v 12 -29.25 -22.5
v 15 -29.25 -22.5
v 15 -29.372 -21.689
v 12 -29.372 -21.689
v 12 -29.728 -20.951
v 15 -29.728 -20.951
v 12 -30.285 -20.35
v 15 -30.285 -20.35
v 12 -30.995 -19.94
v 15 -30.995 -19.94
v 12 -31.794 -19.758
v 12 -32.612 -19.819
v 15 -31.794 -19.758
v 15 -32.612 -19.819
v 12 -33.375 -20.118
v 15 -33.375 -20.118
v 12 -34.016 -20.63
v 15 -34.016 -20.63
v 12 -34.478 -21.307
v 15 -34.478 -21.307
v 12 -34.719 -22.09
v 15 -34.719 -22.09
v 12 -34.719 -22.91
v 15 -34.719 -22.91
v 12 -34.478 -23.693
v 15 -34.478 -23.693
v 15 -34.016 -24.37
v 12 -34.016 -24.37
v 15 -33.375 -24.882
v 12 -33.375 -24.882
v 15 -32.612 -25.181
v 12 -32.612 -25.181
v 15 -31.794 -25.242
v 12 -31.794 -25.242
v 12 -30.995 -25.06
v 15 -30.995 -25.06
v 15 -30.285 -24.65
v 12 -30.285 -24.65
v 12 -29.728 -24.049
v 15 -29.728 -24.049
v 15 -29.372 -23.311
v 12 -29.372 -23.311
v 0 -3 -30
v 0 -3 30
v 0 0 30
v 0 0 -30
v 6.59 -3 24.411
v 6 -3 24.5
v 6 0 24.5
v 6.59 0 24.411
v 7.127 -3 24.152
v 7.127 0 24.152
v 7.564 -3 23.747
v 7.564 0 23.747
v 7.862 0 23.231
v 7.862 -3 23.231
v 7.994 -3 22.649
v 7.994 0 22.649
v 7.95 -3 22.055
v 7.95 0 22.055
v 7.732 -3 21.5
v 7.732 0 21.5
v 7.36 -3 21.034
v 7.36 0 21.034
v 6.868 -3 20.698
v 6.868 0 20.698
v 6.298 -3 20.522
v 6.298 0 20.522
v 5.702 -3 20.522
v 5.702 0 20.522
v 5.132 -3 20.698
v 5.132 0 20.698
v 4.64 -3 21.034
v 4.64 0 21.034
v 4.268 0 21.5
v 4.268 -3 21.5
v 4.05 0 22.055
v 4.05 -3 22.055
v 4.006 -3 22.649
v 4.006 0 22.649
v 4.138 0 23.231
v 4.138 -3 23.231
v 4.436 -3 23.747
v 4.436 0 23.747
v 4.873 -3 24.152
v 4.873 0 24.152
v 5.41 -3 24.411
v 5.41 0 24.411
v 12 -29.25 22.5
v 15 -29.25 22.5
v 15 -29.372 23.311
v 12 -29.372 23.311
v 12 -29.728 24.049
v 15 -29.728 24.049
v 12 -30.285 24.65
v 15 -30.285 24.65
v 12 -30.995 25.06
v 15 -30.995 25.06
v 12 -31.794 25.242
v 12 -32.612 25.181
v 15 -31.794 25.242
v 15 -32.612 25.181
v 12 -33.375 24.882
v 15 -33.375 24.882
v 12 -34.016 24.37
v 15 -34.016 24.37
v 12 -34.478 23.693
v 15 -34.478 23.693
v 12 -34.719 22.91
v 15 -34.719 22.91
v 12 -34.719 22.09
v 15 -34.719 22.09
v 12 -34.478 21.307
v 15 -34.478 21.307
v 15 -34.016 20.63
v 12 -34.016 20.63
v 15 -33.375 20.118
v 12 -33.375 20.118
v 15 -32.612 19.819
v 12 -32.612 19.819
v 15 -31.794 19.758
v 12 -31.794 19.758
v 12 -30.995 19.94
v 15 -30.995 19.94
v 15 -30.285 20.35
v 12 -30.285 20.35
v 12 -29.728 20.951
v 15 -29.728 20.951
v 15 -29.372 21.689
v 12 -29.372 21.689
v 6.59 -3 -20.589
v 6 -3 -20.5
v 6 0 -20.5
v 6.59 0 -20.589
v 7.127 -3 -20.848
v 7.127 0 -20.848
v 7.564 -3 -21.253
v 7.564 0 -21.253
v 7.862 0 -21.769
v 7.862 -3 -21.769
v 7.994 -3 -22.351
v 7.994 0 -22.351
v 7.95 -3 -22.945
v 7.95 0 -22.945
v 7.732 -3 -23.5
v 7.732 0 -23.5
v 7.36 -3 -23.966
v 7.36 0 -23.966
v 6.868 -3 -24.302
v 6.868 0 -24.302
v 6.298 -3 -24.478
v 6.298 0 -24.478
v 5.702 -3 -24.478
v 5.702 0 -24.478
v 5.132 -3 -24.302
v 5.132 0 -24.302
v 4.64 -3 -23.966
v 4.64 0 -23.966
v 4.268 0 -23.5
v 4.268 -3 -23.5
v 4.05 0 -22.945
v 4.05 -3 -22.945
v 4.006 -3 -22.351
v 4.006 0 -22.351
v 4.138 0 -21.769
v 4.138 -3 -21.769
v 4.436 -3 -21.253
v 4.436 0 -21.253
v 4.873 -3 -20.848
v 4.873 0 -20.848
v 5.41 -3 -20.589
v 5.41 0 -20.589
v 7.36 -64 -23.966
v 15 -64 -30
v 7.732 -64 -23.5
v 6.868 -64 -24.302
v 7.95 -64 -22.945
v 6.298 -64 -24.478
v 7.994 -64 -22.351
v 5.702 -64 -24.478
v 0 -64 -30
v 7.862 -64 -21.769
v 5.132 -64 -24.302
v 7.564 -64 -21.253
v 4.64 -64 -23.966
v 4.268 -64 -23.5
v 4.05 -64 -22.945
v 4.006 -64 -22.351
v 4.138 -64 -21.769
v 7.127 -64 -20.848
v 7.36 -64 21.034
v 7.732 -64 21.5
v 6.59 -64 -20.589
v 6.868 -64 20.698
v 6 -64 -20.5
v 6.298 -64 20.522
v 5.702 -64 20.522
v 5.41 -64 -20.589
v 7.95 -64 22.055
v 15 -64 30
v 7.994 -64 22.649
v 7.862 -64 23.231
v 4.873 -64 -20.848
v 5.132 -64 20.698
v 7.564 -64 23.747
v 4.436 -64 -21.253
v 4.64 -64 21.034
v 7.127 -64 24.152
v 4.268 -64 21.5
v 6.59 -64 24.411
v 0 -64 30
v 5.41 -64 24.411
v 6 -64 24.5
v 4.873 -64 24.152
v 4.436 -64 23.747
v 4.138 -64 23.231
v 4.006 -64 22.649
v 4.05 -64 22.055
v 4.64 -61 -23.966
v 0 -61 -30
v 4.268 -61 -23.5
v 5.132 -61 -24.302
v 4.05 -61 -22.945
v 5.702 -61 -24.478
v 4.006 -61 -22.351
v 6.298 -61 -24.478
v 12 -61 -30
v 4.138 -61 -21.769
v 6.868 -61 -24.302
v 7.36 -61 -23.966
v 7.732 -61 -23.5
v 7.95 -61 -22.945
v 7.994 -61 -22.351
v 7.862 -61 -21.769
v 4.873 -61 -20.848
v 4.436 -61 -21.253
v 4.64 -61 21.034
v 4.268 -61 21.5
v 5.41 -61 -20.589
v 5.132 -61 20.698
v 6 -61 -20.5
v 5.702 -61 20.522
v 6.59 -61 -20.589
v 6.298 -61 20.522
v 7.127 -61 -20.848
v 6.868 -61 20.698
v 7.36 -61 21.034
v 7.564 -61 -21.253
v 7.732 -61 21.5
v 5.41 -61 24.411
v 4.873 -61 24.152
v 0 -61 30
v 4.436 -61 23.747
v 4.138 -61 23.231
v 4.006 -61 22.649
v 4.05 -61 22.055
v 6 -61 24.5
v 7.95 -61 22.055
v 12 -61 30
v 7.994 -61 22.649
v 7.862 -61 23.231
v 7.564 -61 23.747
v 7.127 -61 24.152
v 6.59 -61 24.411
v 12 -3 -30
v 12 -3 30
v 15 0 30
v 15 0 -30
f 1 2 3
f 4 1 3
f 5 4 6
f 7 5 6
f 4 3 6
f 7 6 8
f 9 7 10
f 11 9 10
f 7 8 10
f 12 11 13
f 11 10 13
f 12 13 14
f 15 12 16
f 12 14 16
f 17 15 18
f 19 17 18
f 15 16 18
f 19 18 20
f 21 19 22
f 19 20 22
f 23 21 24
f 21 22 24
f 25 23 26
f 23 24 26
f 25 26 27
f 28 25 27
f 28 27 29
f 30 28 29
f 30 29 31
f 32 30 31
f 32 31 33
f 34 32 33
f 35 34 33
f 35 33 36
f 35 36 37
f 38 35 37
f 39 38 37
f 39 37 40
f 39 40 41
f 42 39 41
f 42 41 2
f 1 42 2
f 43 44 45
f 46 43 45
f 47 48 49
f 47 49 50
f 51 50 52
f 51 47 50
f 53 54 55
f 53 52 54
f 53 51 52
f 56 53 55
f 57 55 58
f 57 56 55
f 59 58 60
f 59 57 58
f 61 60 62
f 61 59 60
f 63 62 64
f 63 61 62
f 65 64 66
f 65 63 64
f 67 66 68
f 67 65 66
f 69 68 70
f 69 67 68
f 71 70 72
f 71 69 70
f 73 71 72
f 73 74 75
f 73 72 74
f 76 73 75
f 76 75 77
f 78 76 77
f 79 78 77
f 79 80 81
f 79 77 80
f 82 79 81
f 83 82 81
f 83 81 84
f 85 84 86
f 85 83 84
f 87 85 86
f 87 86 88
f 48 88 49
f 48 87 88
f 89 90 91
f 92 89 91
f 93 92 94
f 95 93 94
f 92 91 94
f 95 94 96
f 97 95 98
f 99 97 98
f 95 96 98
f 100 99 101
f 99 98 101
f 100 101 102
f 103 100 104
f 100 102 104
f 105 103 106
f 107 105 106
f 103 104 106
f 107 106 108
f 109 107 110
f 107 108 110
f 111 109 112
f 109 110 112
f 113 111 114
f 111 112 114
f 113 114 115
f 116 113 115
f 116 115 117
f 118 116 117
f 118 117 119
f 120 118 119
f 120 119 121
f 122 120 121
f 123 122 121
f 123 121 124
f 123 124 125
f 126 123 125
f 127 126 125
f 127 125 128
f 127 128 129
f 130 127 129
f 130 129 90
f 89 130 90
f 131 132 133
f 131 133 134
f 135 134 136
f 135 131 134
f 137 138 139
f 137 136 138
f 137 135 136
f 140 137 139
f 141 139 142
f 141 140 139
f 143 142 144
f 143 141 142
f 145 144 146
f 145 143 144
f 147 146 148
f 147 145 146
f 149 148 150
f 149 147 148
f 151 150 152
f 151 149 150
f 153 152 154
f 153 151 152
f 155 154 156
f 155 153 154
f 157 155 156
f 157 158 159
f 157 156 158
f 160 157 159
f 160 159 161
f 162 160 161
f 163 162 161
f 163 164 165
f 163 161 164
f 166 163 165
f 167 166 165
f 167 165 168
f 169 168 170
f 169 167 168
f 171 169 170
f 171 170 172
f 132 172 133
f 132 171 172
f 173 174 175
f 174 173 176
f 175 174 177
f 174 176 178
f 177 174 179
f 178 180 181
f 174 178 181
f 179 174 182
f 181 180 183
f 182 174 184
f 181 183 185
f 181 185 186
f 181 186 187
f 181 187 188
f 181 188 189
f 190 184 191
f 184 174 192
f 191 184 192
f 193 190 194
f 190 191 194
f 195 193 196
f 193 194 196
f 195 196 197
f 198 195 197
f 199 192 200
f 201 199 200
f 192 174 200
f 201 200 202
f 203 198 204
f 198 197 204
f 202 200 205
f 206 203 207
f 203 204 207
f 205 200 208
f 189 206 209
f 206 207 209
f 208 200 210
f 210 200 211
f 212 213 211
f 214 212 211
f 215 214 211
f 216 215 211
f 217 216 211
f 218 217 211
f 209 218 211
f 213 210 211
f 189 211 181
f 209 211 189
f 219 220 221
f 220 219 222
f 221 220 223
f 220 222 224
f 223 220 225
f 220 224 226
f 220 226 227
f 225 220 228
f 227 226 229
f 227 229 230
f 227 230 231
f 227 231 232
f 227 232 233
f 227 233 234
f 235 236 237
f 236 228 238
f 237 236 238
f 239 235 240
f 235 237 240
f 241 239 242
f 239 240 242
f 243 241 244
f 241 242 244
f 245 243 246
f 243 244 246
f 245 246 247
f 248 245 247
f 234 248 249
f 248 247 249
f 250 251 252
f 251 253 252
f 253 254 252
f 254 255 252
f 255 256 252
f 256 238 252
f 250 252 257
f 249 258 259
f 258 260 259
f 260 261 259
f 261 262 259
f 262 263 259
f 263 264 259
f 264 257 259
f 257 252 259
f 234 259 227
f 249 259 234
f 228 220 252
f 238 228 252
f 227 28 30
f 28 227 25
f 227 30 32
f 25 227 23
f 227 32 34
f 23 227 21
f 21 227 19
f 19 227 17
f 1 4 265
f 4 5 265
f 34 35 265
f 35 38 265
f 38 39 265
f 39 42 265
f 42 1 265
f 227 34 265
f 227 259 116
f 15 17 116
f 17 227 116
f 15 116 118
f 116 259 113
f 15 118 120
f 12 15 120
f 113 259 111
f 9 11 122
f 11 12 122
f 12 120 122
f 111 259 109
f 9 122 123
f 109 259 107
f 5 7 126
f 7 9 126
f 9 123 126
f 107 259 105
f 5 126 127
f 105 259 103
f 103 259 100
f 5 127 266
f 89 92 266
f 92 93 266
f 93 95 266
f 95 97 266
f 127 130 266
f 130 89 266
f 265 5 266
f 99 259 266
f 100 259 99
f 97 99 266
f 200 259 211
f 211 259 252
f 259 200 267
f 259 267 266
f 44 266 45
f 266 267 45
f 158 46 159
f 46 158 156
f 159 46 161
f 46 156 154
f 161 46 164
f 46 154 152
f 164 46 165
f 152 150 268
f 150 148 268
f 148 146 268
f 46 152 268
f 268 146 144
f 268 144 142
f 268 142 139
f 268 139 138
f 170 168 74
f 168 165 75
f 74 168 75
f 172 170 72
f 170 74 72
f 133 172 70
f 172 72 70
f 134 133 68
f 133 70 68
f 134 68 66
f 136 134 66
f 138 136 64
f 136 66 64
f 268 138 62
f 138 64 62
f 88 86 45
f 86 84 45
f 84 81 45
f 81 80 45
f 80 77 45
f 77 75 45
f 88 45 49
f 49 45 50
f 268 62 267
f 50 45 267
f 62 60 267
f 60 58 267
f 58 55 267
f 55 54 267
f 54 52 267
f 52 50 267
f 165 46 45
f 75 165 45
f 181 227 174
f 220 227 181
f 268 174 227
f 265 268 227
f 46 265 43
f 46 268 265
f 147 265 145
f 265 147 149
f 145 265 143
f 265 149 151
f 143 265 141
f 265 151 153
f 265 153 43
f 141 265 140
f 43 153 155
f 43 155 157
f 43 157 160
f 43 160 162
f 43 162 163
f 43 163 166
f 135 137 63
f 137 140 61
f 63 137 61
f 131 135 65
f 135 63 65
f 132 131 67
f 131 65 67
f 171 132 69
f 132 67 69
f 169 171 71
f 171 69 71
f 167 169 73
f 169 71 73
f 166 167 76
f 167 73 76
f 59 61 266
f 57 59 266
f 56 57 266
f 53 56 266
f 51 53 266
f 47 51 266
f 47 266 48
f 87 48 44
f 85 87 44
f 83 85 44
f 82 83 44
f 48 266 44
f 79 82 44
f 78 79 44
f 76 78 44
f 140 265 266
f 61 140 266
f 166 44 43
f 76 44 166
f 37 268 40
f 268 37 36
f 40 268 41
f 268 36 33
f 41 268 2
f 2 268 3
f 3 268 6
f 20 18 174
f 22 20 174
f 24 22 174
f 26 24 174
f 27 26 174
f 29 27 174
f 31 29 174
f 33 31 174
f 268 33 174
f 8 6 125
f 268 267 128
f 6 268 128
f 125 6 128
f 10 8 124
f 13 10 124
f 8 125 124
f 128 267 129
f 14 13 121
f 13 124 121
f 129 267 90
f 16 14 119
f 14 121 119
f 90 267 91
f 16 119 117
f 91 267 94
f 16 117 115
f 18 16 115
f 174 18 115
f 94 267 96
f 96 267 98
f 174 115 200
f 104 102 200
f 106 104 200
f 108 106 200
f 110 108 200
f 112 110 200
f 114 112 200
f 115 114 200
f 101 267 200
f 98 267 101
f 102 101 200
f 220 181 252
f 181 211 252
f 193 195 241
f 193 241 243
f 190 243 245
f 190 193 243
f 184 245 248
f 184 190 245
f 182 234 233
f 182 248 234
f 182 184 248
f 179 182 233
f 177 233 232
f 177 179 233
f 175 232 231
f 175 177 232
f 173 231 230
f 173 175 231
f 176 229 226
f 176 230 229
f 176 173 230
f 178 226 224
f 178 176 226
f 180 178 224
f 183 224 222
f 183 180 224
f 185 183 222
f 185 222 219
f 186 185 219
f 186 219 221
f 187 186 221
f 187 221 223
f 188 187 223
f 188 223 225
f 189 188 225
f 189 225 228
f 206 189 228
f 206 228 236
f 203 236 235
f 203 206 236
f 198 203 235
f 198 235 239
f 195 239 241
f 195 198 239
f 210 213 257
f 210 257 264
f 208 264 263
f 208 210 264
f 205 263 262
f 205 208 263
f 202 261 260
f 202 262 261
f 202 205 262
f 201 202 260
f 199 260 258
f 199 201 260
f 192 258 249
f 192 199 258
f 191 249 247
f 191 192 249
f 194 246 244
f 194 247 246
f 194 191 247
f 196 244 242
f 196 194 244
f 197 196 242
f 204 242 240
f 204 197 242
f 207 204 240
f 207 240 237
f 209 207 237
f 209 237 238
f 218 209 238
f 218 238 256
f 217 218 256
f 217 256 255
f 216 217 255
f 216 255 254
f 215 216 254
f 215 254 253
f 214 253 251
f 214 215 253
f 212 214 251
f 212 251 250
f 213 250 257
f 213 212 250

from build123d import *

# Parameters (mm, degrees)
EXTRUDE_1_DEPTH          = 30
CUT_EXTRUDE_1_DEPTH      = 73.256487598
CUT_EXTRUDE_1_DEPTH_BACK = 73.256487598
SKETCH_2_R               = 2
SKETCH_3_R               = 2.75
CUT_EXTRUDE_2_DEPTH      = 73.256487598


with BuildPart() as part:
    # 草图1 → 凸台-拉伸1 (new, symmetric)
    with BuildSketch(Plane.XY):
        Polygon((0, 0), (15, 0), (15, -64), (0, -64), (0, -61), (12, -61), (12, -3), (0, -3), align=None)
    extrude(amount=EXTRUDE_1_DEPTH, both=True)

    # 草图2 → 切除-拉伸1 (cut, two sides: drawn at the far end of the back side and taken through both)
    with BuildSketch(Plane(origin=(0, 0, 0), x_dir=(1, 0, 0), z_dir=(0, 1, 0)).offset(-CUT_EXTRUDE_1_DEPTH_BACK)):
        with Locations(Location((6, 22.5, 0), (0, 0, 270))):
            Circle(SKETCH_2_R)
        with Locations(Location((6, -22.5, 0), (0, 0, 270))):
            Circle(SKETCH_2_R)
    extrude(amount=CUT_EXTRUDE_1_DEPTH + CUT_EXTRUDE_1_DEPTH_BACK, mode=Mode.SUBTRACT)

    # 草图3 → 切除-拉伸2 (cut, through all)
    with BuildSketch(Plane(origin=(15, 0, 0), x_dir=(0, 0, -1), z_dir=(1, 0, 0))):
        with Locations(Location((-22.5, -32, 0), (0, 0, 90))):
            Circle(SKETCH_3_R)
        with Locations(Location((22.5, -32, 0), (0, 0, 90))):
            Circle(SKETCH_3_R)
    extrude(amount=-CUT_EXTRUDE_2_DEPTH, mode=Mode.SUBTRACT)


solid = part.part
